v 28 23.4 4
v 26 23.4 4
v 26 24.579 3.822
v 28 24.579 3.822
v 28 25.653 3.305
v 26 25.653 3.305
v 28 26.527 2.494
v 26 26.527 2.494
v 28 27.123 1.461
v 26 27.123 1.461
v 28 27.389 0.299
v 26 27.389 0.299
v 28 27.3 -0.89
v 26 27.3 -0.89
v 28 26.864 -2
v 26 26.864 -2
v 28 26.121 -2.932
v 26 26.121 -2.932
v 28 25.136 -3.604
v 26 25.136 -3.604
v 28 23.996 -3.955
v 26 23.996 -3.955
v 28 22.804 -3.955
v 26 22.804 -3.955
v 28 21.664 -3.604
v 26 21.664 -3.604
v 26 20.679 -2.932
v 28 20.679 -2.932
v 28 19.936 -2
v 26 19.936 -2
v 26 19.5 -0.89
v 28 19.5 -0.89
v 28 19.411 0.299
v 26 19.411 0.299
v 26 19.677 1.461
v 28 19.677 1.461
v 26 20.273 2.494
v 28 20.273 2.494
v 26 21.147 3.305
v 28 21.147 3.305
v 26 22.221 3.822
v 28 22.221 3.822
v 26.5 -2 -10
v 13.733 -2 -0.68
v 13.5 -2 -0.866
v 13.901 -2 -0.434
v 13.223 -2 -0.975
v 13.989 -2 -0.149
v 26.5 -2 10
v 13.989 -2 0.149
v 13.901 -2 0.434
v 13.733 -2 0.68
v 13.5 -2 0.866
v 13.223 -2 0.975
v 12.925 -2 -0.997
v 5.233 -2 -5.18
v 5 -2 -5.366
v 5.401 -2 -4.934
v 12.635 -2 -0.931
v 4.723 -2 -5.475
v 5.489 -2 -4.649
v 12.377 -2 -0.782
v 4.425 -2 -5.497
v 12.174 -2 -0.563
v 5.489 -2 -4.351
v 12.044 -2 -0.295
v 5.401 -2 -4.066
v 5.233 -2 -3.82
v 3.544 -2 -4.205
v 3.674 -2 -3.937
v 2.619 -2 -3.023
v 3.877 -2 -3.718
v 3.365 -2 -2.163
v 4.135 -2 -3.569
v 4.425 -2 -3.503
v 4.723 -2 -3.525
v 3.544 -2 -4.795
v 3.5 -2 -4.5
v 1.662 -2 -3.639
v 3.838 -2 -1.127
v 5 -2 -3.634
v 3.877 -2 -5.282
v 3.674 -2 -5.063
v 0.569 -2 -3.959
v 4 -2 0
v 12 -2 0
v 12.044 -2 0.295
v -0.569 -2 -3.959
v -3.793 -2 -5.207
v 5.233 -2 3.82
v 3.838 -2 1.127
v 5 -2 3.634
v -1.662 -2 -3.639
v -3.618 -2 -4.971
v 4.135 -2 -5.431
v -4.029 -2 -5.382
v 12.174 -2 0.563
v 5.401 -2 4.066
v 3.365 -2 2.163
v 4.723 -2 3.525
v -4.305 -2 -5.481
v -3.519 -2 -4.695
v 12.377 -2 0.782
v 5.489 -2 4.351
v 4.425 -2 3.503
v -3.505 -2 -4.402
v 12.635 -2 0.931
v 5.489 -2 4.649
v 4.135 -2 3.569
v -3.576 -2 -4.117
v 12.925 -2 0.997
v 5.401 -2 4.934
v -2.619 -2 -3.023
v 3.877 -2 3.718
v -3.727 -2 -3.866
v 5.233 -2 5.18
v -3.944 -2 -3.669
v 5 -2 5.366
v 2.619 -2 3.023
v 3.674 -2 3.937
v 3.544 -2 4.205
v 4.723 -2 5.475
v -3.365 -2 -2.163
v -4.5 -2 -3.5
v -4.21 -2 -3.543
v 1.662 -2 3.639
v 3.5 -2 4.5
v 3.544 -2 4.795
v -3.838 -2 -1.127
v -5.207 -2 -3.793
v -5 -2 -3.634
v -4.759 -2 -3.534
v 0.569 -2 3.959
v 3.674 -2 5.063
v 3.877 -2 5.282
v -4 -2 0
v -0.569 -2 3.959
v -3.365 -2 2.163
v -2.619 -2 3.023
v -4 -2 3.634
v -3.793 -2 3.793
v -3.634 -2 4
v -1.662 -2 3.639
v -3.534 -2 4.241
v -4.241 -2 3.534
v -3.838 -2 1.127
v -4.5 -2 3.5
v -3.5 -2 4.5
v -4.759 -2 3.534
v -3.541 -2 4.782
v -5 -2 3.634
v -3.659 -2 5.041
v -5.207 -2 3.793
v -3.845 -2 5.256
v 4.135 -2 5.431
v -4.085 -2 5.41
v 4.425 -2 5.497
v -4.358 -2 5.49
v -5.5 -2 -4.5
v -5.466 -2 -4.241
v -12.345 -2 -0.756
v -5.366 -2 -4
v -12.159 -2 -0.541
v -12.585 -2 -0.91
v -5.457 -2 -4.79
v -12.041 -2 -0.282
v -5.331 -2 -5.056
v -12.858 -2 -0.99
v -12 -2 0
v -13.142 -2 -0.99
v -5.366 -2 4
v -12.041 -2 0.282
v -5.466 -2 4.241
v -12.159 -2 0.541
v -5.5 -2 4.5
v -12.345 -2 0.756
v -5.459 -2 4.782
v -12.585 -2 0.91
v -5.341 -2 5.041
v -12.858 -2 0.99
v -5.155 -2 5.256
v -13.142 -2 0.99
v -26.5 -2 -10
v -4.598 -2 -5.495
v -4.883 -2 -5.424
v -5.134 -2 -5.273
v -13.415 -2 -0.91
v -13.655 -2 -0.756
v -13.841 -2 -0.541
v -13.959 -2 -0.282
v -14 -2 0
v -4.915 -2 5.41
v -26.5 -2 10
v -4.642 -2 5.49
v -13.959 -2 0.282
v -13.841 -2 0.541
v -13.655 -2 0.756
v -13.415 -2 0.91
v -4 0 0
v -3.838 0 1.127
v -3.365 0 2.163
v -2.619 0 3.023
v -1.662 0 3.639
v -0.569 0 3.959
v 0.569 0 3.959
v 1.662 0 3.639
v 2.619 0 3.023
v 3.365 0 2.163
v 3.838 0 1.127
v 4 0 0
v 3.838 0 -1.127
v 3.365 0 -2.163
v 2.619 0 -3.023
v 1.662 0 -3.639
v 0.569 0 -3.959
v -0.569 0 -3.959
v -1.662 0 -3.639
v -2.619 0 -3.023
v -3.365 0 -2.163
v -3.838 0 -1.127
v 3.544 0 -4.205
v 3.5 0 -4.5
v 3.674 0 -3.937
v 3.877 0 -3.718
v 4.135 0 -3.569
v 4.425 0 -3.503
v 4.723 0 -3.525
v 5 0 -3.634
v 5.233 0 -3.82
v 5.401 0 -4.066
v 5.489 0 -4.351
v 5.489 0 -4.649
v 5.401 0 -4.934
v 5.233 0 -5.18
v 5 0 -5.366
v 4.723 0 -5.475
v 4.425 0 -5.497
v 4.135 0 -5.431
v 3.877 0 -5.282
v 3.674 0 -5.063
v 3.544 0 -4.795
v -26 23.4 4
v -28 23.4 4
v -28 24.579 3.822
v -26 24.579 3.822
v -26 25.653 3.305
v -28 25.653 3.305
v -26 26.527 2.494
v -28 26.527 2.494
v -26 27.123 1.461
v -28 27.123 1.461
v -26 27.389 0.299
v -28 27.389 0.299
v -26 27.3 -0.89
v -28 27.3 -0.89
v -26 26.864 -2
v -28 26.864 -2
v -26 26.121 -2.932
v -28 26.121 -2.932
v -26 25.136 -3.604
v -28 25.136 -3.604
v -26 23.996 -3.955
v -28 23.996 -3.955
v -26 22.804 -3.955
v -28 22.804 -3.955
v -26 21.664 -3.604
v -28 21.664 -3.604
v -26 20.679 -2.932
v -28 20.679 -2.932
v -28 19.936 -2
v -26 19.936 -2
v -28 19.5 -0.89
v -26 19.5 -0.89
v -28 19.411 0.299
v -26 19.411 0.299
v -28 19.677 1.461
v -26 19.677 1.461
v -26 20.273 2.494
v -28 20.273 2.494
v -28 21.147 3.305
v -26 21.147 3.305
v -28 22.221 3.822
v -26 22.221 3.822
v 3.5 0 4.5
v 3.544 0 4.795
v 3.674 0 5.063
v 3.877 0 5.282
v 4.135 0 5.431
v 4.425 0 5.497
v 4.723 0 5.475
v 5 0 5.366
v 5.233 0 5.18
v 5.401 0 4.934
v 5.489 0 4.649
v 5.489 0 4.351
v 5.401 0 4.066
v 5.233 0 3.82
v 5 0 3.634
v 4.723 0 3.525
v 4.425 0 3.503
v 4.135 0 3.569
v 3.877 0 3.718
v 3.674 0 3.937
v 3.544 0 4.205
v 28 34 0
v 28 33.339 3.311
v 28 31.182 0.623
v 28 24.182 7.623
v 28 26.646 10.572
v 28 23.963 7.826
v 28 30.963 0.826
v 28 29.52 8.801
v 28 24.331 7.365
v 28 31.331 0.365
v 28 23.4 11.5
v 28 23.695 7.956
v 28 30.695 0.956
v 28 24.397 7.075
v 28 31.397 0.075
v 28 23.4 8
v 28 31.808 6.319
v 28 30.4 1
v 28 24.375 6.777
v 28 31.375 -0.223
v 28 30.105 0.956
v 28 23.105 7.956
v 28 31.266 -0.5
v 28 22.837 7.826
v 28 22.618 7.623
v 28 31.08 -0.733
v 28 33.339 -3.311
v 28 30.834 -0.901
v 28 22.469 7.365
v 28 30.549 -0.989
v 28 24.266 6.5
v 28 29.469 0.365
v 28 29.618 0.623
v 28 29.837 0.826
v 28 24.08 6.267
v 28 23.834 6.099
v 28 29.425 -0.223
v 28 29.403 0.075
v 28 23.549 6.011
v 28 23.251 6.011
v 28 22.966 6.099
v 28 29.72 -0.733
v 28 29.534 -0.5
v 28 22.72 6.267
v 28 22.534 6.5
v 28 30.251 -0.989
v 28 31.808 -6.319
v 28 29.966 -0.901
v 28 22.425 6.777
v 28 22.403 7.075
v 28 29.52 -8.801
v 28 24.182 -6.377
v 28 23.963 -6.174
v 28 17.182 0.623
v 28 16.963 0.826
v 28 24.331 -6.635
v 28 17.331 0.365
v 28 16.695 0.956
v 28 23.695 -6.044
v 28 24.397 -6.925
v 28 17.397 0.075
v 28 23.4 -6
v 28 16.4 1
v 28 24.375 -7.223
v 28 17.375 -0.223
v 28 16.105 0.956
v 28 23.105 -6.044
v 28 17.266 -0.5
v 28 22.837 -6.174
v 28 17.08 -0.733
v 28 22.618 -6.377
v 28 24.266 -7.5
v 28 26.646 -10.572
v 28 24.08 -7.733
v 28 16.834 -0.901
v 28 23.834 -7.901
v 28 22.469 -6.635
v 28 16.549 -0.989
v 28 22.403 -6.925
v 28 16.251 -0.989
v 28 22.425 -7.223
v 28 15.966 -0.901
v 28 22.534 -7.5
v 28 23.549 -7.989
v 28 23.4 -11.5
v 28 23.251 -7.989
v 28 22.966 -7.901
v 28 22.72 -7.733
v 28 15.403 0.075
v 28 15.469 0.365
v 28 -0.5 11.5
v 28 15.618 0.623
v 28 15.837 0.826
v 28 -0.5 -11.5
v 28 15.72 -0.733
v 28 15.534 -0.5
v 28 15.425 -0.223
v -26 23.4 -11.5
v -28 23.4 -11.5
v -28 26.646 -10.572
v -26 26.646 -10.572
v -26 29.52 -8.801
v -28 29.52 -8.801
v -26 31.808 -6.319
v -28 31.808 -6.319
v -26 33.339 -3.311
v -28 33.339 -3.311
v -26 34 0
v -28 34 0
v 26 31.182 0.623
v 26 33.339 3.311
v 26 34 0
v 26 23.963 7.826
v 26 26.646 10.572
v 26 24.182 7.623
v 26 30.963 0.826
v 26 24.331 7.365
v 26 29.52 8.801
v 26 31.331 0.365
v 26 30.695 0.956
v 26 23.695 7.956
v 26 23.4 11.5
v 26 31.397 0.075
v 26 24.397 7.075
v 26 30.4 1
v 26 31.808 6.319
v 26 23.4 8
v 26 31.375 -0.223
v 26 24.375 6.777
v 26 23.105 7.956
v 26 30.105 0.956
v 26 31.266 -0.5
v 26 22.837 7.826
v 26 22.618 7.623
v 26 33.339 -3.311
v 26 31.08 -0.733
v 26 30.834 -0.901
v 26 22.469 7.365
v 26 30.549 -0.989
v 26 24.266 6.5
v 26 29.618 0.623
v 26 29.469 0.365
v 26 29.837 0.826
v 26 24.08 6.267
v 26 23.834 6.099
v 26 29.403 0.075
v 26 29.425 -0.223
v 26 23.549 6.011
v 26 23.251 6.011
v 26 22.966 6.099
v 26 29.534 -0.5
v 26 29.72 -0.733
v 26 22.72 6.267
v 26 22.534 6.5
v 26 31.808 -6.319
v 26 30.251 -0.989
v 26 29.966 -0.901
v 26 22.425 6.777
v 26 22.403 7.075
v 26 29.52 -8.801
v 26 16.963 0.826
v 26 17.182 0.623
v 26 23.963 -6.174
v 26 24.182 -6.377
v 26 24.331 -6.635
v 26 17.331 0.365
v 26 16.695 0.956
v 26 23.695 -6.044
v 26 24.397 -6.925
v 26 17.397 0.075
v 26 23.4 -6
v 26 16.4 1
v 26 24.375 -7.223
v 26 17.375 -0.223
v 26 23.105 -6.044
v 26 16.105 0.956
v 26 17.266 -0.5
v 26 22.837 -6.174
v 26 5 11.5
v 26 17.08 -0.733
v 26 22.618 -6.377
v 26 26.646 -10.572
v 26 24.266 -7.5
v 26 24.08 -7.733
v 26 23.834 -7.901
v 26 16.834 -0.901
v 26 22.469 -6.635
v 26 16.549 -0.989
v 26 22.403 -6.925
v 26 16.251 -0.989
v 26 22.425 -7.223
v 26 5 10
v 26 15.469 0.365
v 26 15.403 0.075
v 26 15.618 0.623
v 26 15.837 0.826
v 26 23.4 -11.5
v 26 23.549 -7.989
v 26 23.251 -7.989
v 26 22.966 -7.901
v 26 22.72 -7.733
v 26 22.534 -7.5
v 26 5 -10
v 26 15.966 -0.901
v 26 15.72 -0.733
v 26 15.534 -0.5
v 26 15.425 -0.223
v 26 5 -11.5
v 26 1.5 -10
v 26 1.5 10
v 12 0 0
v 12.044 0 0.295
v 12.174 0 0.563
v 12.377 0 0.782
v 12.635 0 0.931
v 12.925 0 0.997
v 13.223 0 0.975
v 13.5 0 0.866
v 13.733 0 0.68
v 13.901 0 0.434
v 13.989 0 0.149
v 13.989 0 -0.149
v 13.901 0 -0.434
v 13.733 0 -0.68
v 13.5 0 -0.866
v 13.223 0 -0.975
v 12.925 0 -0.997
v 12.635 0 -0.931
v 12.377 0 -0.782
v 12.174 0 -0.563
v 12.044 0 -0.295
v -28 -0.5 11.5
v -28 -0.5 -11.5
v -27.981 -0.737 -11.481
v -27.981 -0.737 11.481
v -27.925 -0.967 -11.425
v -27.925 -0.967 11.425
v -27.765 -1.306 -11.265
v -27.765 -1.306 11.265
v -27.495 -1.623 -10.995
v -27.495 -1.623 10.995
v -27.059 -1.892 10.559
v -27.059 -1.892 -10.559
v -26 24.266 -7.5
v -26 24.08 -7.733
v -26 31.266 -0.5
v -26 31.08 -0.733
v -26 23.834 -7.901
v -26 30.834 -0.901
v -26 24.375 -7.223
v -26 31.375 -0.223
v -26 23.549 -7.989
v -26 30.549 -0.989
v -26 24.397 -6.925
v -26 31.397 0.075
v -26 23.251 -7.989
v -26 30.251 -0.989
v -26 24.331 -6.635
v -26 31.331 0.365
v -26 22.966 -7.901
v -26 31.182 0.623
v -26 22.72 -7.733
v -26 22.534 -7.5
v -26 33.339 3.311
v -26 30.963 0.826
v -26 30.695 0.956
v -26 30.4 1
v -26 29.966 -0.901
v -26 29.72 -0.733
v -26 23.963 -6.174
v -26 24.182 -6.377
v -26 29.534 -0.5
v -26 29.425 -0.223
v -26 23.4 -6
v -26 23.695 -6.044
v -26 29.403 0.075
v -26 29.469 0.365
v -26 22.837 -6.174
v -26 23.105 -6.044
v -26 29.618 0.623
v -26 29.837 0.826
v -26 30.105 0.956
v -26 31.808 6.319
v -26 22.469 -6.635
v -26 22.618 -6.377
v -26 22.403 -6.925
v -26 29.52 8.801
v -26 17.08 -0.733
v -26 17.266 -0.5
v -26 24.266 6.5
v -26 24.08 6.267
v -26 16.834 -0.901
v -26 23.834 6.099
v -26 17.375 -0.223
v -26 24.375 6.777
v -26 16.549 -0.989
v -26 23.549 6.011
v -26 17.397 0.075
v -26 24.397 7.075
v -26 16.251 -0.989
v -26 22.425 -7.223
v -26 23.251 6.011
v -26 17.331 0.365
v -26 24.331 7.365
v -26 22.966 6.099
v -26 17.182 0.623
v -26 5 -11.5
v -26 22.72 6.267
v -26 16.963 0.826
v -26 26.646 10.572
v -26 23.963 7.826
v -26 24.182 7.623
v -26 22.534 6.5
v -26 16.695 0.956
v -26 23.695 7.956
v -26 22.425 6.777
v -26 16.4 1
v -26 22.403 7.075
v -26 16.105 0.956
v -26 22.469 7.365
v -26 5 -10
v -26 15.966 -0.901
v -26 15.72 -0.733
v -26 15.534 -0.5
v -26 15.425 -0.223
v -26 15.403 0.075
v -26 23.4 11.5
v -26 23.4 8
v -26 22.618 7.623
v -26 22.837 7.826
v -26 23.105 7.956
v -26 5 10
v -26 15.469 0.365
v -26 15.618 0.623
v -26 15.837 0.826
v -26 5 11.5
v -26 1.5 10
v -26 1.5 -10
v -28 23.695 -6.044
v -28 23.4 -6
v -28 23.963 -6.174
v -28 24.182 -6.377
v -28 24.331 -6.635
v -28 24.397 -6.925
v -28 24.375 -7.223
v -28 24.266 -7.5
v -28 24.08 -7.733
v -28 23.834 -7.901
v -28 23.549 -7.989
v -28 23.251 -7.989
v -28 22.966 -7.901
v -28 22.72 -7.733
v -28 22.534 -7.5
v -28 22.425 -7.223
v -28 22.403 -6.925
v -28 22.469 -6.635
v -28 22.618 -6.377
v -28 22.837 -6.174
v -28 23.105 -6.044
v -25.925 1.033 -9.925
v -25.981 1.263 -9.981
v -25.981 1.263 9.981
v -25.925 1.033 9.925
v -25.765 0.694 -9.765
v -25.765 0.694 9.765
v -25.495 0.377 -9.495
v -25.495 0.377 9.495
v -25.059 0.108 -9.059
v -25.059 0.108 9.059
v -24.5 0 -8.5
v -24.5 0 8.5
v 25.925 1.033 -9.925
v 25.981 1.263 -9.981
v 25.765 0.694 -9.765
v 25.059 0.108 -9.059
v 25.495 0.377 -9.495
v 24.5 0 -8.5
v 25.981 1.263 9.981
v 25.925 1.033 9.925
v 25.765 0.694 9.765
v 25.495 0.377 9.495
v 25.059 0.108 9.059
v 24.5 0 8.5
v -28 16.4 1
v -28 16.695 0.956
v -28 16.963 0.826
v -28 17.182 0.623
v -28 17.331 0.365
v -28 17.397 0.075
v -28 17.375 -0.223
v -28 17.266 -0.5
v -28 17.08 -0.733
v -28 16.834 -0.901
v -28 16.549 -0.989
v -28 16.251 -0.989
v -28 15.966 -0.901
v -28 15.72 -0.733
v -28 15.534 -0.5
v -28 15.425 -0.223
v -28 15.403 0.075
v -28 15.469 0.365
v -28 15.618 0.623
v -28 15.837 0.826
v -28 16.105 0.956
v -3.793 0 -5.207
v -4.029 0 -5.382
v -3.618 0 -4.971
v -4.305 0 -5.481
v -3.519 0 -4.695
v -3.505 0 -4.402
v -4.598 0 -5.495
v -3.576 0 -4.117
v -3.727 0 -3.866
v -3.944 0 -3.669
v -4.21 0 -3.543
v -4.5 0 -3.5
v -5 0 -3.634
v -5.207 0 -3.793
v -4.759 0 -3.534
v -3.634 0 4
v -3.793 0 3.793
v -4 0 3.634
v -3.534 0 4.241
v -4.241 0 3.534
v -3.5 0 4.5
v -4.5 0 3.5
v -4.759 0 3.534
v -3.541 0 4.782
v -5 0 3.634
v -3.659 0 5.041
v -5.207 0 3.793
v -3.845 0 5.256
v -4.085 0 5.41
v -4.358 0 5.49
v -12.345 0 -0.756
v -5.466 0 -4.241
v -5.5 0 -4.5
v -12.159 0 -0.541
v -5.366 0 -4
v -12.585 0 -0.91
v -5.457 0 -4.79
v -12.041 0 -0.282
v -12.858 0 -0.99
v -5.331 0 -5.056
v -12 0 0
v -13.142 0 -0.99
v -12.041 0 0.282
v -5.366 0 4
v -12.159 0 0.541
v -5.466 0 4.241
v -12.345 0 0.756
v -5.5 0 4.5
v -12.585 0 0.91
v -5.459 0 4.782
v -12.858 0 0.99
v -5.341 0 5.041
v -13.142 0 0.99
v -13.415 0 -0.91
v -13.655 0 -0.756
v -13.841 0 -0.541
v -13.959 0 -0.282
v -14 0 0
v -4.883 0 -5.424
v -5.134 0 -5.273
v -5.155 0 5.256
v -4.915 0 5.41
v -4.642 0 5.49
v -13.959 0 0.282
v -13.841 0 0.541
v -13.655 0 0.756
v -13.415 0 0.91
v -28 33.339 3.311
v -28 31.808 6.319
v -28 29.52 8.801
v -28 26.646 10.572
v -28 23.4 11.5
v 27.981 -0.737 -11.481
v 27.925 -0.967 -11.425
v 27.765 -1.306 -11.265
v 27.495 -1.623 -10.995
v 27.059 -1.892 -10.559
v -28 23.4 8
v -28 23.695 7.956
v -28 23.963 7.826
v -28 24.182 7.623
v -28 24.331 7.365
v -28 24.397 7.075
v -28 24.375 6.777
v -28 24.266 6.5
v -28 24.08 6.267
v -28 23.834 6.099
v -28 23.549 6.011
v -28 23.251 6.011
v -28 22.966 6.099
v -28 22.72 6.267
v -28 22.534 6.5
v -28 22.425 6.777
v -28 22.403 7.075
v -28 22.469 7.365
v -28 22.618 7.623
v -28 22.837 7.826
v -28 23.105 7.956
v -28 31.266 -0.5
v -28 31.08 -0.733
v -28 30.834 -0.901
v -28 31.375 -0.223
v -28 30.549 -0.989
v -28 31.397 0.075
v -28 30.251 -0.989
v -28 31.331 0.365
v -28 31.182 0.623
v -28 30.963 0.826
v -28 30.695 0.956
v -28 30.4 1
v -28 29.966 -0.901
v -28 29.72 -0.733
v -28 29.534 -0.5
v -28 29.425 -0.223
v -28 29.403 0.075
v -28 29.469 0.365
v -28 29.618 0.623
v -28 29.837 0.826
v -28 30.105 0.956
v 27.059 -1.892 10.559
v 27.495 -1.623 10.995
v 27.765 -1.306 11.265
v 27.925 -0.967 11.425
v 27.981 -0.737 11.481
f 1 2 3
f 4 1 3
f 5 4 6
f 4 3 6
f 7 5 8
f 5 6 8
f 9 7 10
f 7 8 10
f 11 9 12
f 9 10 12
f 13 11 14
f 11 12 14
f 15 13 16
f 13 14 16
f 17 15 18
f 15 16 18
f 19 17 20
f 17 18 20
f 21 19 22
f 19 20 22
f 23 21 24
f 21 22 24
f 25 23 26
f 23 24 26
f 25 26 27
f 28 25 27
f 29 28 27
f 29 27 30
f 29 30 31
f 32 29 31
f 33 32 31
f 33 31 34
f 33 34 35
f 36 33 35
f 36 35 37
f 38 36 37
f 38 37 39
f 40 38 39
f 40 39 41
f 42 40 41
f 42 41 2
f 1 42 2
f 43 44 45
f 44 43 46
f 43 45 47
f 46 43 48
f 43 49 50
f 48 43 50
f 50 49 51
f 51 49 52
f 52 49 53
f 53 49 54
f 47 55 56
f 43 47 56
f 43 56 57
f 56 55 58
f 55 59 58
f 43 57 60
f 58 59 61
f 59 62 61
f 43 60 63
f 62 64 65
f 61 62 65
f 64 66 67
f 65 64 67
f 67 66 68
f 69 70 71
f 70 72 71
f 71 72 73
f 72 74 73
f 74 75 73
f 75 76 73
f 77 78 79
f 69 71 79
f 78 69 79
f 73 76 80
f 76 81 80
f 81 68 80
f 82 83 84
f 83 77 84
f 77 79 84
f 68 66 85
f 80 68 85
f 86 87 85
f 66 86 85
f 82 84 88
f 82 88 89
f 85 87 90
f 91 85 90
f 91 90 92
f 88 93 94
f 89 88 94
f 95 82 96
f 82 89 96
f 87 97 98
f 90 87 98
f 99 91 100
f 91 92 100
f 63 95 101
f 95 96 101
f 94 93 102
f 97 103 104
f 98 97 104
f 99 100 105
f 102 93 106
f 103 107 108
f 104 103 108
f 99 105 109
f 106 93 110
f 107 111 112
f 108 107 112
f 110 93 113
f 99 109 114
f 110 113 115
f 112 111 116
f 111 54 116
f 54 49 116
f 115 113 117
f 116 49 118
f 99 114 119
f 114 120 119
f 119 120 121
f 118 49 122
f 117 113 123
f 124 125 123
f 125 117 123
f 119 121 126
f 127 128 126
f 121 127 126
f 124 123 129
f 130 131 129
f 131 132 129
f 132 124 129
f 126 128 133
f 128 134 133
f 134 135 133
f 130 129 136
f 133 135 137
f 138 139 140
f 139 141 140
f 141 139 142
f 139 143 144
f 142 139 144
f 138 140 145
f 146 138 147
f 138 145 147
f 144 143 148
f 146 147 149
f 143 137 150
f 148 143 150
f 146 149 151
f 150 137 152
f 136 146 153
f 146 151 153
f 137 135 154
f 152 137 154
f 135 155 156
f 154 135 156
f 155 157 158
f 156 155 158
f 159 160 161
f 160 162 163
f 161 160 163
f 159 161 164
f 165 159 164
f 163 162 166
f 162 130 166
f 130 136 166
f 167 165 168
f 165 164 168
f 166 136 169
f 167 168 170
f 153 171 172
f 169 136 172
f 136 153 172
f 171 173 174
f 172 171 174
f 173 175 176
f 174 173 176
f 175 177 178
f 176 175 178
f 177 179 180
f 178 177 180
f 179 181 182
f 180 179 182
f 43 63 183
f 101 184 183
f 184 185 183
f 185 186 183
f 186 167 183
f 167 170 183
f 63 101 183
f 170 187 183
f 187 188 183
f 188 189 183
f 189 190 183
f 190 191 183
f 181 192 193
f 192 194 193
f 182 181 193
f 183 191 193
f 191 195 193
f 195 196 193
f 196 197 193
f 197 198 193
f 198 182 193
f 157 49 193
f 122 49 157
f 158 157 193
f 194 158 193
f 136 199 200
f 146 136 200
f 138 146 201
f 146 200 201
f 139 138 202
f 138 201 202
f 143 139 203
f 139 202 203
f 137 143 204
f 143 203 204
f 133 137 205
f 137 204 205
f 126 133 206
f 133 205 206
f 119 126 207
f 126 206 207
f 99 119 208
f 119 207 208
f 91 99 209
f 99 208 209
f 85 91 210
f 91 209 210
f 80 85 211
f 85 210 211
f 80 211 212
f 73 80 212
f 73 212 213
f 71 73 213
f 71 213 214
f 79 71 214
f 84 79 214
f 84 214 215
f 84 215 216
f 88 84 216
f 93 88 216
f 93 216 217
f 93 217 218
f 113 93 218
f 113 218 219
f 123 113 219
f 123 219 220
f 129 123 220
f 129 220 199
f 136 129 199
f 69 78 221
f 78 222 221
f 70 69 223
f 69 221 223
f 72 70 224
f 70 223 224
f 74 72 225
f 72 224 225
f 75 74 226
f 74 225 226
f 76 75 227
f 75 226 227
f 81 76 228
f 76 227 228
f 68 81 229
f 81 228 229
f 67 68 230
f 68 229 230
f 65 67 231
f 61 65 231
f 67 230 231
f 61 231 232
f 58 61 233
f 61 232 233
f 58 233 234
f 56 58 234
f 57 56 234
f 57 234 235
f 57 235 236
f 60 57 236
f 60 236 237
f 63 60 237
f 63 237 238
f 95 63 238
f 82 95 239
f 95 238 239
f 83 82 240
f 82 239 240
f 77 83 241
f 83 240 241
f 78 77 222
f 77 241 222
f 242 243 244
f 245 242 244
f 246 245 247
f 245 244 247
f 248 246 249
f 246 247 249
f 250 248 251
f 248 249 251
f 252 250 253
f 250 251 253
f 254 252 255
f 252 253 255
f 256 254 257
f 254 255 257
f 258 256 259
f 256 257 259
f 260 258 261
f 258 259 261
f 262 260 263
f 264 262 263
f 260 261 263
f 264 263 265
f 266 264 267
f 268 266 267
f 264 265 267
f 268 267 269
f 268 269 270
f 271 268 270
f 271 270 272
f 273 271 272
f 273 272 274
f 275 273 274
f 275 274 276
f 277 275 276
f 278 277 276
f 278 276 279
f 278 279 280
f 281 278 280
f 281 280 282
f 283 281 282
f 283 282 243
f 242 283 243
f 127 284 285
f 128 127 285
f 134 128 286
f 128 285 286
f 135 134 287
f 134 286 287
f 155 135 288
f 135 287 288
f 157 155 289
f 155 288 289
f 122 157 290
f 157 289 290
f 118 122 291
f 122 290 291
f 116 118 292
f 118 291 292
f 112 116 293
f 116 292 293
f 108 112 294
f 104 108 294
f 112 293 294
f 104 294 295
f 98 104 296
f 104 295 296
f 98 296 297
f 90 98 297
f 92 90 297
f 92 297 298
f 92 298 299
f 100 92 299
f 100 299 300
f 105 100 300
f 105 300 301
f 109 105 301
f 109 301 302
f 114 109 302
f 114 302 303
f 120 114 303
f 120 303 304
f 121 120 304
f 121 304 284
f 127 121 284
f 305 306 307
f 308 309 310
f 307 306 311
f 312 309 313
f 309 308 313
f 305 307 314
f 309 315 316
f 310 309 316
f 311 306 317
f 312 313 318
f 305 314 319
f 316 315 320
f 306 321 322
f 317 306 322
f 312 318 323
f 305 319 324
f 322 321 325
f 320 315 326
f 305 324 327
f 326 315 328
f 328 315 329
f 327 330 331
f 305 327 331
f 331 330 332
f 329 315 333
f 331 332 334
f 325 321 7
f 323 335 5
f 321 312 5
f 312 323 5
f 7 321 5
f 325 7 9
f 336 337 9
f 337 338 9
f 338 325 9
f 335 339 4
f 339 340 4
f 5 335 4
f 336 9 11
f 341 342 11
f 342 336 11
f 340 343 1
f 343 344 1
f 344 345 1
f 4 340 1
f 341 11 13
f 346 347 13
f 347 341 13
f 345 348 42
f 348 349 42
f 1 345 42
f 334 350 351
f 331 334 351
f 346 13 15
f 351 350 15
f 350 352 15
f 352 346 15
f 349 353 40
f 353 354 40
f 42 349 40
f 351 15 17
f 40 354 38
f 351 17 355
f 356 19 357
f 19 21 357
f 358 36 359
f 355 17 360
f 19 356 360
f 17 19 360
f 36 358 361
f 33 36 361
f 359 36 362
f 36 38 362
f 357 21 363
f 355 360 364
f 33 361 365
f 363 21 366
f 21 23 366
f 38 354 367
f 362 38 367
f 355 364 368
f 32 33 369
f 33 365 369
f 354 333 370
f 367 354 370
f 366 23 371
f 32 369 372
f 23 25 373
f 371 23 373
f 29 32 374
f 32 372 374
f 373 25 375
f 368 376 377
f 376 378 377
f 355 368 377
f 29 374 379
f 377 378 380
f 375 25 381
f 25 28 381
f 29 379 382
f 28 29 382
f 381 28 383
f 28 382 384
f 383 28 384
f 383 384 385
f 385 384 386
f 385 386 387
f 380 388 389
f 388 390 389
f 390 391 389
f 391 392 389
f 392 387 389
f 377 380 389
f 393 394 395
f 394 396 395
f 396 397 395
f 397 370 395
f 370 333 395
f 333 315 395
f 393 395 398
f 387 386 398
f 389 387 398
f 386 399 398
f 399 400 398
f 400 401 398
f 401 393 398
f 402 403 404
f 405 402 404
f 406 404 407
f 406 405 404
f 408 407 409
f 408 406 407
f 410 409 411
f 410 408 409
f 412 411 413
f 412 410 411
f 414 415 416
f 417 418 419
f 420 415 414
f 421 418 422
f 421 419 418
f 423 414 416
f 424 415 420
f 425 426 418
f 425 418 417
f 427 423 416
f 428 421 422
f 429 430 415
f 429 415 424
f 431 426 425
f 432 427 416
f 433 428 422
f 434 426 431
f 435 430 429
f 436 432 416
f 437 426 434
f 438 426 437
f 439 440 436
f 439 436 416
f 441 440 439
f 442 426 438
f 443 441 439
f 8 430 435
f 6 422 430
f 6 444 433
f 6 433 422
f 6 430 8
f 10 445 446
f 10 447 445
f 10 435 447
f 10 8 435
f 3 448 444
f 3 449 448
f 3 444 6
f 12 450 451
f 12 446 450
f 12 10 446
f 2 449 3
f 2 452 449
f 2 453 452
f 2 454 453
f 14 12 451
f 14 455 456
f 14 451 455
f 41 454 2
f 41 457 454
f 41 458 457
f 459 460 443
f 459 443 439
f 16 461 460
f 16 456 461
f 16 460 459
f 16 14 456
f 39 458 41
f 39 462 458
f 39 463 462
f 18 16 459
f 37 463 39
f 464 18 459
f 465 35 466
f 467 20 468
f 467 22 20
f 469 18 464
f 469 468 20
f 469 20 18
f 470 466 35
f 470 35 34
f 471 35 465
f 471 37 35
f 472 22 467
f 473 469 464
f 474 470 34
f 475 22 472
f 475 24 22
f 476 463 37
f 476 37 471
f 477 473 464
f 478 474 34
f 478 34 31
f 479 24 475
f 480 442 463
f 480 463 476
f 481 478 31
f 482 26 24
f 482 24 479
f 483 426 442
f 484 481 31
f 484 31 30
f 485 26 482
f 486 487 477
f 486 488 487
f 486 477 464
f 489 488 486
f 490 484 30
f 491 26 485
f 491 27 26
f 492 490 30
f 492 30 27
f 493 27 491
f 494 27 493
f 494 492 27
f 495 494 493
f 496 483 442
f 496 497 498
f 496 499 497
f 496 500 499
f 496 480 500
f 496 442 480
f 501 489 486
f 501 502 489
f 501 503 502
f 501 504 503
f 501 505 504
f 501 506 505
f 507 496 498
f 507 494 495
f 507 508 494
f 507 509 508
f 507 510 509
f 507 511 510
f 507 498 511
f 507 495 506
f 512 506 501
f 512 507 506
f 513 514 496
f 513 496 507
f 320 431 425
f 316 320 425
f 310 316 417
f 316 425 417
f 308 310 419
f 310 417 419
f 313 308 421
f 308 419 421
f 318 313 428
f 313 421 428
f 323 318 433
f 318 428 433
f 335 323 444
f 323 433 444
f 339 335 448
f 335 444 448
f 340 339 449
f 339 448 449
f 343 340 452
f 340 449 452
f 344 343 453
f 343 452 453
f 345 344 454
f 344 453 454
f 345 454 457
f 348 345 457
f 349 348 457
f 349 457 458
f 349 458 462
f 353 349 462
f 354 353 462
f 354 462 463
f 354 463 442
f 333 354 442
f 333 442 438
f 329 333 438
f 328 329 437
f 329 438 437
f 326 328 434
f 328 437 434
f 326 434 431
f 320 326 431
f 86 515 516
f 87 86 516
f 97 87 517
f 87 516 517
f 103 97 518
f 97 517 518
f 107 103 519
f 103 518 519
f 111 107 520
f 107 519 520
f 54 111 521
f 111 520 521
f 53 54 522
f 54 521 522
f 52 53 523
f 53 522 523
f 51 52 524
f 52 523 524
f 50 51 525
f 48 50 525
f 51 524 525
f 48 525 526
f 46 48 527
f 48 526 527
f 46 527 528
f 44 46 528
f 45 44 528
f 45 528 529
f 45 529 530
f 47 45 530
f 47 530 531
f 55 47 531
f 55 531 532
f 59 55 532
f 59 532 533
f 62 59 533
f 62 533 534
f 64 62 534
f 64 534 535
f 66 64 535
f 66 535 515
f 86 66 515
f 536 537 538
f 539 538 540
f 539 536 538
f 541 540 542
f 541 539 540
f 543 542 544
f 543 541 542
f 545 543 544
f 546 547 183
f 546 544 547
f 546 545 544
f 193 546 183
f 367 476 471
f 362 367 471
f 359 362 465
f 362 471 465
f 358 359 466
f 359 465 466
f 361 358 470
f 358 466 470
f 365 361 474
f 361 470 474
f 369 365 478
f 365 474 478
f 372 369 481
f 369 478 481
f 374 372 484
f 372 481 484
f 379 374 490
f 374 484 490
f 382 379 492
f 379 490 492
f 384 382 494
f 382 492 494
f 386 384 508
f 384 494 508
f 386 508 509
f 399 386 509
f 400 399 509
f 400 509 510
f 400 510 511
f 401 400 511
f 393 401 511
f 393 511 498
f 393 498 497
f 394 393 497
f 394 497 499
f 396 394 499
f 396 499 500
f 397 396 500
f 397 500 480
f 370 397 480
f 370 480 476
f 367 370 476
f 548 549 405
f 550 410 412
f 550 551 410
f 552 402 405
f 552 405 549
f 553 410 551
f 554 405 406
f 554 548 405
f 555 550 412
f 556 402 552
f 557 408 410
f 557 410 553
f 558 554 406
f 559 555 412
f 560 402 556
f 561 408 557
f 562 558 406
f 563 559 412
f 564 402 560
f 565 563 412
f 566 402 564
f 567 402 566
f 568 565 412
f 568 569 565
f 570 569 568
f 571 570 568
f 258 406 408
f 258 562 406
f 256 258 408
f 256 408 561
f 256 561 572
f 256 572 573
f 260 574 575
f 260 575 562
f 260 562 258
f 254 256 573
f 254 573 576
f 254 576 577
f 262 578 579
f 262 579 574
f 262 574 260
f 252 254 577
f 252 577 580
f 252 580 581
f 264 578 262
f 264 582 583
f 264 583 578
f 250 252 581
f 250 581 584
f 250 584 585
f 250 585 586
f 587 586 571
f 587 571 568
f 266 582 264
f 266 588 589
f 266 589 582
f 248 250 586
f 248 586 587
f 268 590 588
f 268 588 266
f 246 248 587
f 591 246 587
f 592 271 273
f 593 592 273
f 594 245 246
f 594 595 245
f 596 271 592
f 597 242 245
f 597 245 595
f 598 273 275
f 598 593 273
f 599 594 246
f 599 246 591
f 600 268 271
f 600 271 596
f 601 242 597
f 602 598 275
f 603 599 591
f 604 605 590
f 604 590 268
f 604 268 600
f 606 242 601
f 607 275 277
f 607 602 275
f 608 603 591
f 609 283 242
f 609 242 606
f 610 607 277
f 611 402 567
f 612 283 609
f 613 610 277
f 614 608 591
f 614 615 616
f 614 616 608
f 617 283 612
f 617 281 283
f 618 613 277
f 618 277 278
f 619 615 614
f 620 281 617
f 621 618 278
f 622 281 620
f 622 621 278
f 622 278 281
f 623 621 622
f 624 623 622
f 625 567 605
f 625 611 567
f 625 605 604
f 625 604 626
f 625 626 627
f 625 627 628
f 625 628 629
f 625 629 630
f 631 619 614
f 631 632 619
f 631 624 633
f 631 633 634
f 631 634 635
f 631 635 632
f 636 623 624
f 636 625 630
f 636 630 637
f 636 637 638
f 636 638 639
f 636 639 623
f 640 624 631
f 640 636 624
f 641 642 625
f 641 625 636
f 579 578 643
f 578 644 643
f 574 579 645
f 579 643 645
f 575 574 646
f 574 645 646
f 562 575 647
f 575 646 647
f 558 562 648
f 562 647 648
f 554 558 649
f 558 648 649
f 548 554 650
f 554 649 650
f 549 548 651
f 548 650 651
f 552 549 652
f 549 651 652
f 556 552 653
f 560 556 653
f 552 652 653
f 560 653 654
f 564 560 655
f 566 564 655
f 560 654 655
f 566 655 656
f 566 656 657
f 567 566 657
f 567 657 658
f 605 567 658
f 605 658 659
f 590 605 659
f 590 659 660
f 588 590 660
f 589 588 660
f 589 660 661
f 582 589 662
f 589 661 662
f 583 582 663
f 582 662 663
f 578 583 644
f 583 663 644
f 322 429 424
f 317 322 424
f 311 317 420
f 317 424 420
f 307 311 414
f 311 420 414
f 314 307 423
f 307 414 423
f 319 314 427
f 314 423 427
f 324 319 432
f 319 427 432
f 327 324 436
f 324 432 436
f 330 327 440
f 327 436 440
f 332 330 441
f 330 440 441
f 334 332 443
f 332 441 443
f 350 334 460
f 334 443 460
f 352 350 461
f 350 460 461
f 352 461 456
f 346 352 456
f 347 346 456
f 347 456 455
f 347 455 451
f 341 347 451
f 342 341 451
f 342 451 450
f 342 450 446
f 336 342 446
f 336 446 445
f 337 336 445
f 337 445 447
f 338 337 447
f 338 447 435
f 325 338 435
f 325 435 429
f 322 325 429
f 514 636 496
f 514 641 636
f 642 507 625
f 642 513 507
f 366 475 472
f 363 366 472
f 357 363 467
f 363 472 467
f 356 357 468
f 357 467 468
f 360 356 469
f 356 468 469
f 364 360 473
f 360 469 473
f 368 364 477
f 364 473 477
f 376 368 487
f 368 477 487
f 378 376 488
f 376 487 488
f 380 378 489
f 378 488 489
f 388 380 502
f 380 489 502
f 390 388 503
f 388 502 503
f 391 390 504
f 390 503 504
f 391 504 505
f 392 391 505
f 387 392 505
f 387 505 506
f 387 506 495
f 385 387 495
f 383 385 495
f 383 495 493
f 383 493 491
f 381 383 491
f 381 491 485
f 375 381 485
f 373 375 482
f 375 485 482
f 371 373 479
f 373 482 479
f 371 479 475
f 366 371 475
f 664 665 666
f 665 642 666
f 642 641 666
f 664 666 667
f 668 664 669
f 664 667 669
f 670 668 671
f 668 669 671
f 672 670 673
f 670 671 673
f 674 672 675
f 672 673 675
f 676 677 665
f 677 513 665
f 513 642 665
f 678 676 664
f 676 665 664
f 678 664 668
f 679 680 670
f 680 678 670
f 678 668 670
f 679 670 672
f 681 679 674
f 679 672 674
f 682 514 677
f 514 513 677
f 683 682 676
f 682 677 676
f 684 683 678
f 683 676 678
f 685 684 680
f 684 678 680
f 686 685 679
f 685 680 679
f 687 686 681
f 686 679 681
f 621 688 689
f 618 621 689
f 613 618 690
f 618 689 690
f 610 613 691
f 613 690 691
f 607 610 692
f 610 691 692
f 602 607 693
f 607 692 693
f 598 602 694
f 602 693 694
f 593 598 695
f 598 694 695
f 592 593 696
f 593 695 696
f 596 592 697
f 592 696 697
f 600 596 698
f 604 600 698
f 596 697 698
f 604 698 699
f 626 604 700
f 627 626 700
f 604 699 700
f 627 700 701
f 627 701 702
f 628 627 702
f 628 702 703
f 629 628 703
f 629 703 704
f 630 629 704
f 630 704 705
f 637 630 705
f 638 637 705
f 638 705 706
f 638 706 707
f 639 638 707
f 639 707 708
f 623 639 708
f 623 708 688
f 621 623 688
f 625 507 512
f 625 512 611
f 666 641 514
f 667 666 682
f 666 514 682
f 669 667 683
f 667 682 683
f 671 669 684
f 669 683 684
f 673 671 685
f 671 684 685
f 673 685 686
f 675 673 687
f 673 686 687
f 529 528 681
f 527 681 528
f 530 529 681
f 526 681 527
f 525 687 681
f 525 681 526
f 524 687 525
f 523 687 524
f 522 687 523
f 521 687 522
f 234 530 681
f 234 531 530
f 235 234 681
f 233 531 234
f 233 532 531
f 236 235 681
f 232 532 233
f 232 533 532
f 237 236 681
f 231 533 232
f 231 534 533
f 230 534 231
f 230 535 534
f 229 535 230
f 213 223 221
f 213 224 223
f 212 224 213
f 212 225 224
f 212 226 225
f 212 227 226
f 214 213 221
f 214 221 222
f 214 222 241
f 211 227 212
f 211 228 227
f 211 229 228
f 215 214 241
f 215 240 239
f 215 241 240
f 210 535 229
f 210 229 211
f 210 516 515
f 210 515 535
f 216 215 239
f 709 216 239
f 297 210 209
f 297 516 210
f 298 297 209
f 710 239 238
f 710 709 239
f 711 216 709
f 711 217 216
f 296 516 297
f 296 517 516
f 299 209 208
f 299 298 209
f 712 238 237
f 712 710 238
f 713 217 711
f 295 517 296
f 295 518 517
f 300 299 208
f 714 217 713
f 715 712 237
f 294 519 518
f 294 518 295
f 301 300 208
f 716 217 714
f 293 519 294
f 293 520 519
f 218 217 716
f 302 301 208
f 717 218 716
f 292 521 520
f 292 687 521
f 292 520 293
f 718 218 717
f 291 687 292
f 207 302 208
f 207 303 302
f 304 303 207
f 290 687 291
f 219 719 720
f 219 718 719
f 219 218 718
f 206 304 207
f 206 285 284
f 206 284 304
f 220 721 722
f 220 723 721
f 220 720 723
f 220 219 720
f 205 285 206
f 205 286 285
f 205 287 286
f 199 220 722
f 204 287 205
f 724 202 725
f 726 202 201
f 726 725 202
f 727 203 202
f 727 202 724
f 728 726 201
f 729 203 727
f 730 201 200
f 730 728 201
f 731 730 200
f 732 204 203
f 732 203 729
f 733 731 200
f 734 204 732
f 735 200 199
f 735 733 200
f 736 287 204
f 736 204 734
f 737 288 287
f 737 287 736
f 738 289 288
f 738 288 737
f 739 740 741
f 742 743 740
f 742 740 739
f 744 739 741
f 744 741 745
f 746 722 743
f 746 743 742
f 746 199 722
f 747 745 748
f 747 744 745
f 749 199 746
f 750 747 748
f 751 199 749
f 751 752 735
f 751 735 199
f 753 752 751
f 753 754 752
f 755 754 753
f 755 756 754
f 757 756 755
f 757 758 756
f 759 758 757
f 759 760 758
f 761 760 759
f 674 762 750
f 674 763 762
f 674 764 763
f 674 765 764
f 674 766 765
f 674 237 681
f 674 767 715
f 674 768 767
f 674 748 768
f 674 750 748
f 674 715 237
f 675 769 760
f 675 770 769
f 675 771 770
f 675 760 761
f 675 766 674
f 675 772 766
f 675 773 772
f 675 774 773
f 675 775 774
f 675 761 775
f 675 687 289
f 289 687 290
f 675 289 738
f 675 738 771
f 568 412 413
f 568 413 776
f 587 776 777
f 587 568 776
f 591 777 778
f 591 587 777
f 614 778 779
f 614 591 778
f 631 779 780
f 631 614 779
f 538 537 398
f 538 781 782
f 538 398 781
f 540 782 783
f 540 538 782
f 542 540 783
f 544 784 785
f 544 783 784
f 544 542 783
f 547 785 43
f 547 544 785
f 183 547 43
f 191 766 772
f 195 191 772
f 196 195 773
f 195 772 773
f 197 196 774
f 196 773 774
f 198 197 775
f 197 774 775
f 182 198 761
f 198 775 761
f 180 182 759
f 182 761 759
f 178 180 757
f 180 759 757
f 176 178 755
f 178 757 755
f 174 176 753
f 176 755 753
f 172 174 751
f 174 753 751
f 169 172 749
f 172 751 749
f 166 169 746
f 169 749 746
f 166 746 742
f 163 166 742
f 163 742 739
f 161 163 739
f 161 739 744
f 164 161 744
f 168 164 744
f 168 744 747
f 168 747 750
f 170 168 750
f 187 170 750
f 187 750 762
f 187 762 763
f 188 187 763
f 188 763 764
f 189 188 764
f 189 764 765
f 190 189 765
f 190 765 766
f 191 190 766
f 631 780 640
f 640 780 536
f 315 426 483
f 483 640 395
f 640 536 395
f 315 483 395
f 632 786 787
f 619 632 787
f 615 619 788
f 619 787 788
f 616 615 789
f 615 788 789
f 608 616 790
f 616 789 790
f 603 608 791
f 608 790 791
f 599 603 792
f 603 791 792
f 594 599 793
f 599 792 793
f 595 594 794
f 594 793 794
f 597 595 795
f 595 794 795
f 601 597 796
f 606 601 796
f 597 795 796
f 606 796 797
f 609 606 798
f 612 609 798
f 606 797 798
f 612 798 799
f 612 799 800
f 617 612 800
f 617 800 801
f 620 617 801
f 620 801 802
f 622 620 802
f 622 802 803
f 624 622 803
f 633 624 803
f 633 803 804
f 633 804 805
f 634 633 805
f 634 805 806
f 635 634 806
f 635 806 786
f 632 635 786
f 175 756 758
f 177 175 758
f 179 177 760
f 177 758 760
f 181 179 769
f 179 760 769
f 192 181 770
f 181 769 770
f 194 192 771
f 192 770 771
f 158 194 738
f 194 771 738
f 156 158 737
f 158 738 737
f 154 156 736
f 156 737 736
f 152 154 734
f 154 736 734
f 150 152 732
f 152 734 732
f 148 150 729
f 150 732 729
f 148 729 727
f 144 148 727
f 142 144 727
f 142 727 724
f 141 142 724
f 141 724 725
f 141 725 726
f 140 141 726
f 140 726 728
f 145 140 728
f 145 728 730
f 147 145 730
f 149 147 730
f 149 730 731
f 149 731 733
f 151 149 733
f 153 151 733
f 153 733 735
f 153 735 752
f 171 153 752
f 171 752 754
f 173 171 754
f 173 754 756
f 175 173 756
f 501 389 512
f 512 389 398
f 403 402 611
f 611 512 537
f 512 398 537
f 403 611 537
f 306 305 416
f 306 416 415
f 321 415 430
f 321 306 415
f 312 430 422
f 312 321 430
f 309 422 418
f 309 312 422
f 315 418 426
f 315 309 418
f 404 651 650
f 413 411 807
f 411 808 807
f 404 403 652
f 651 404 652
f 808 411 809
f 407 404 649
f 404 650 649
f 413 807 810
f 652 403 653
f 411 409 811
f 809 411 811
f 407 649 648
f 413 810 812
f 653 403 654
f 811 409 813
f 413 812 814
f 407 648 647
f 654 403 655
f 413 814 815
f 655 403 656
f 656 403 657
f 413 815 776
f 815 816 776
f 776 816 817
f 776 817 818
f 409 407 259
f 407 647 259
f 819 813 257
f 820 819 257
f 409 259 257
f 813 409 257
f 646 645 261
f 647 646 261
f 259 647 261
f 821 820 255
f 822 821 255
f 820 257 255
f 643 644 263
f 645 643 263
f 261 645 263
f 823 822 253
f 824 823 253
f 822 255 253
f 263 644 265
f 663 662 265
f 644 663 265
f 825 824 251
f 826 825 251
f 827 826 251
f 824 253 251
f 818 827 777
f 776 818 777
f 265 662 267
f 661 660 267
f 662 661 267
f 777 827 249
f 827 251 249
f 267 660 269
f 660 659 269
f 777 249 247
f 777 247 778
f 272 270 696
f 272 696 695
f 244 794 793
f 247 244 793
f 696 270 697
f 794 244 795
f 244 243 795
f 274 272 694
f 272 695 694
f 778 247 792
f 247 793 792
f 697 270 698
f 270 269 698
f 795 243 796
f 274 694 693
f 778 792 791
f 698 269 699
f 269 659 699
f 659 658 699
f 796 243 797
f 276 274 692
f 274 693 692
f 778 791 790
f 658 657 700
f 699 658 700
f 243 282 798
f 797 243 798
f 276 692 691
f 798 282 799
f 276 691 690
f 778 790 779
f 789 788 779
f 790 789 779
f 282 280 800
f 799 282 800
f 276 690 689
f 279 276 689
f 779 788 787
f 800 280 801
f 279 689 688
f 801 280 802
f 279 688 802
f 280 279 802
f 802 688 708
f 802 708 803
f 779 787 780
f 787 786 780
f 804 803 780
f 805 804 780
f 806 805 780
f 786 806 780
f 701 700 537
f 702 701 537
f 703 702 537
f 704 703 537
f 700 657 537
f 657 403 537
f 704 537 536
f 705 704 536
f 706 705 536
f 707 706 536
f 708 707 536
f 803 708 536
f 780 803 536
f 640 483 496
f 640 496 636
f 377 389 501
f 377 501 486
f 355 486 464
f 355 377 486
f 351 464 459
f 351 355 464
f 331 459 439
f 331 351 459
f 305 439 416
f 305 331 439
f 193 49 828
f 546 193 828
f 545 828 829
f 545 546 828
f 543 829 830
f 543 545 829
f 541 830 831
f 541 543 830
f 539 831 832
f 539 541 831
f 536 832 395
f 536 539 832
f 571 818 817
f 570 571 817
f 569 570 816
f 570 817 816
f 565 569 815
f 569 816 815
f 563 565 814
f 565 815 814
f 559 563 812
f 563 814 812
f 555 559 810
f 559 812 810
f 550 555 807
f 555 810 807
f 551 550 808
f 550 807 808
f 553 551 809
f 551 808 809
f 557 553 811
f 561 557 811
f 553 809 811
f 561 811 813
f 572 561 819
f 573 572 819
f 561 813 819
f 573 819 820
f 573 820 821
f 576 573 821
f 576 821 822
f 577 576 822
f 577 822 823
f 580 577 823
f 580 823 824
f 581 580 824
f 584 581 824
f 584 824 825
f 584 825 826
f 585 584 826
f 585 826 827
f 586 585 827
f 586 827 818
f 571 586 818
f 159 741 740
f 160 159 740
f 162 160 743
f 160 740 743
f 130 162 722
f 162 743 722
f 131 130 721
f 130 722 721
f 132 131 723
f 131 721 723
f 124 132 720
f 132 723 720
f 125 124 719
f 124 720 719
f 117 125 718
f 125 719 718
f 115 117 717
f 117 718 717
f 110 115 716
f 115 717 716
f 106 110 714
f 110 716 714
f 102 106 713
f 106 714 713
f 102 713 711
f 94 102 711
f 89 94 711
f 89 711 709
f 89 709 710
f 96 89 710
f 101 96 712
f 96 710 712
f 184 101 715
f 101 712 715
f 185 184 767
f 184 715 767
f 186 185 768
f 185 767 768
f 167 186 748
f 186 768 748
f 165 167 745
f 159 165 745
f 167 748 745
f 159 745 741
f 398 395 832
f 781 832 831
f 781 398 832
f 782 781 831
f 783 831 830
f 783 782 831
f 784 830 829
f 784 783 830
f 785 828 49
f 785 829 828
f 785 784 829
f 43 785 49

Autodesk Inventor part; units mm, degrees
ref_plane "YZ Plane" through (0, 0, 0) normal (1, 0, 0) x (0, 1, 0)
ref_plane "XZ Plane" through (0, 0, 0) normal (0, 1, 0) x (-1, 0, 0)
ref_plane "XY Plane" through (0, 0, 0) normal (0, 0, 1) x (1, 0, 0)
sketch "Esboço1" plane through (0, 0, 0) normal (0, 1, 0) x (-1, 0, 0)
  line L0 (-25.9999, 11.4129) -> (25.9999, -11.4129) construction
  line L1 (28, 11.5) -> (-28, -11.5) construction
  circle A0 centre (0, 0) radius 4
  line L2 (26, 10) -> (-26, 10)
  line L3 (-26, 10) -> (-26, -10)
  line L4 (-26, -10) -> (26, -10)
  line L5 (26, -10) -> (26, 10)
  line L6 (26, 10) -> (-26, -10) construction
  line L7 (-26, 10) -> (26, -10) construction
  line L8 (13, 0) -> (-13, 0)
  circle A1 centre (-13, 0) radius 1
  circle A2 centre (13, 0) radius 1
  line L9 (4.5, 4.5) -> (-4.5, 4.5)
  line L10 (4.5, -4.5) -> (4.5, 4.5)
  line L11 (4.5, 4.5) -> (-4.5, -4.5) construction
  line L12 (-4.5, 4.5) -> (4.5, -4.5) construction
  circle A3 centre (4.5, 4.5) radius 1
  circle A4 centre (4.5, -4.5) radius 1
  circle A5 centre (-4.5, 4.5) radius 1
  circle A6 centre (-4.5, -4.5) radius 1
  line L13 (28, 11.5) -> (-28, 11.5)
  line L14 (-28, 11.5) -> (-28, -11.5)
  line L15 (-28, -11.5) -> (28, -11.5)
  line L16 (28, -11.5) -> (28, 11.5)
  line L17 (28, 11.5) -> (-28, -11.5) construction
  line L18 (-28, 11.5) -> (28, -11.5) construction
  line L19 (26, -10) -> (26, -11.5)
  line L20 (26, 10) -> (26, 11.5)
  line L21 (-26, 10) -> (-26, 11.5)
  line L22 (-26, -10) -> (-26, -11.5)
  dimension "d0" = 54
  dimension "d1" = 23
  dimension "d2" = 8
  dimension "d3" = 52
  dimension "d4" = 20
  dimension "d5" = 26
  dimension "d6" = 2
  dimension "d7" = 2
  dimension "d8" = 9
  dimension "d9" = 9
  dimension "d10" = 2
  dimension "d13" = 9
  dimension "d16" = 9
  dimension "d19" = 56
  dimension "d20" = 23
extrude "Extrusão1" add sketch "Esboço1" along normal blind 34 and the other way blind 2 contours L20 L13 L16 L15 L19 L5 | L3 L22 L15 L14 L13 L21
extrude "Extrusão2" add sketch "Esboço1" along normal blind 5 and the other way blind 2 contours L2 L21 L13 L20 | L19 L15 L22 L4
extrude "Extrusão3" add sketch "Esboço1" against normal blind 2 contours L5 L4 L3 L2
sketch "Esboço3" plane through (-28, -2, -11.5) normal (-1, 0, 0) x (0, 0, 1)
  line L0 (11.5, 2) -> (11.5, 25.4)
  circle A0 centre (11.5, 25.4) radius 4
  line L1 (11.5, 25.4) -> (11.5, 18.4)
  circle A1 centre (11.5, 18.4) radius 1
  circle A2 centre (18.5, 25.4) radius 1
  circle A3 centre (11.5, 32.4) radius 1
  circle A4 centre (4.5, 25.4) radius 1
  line L2 (11.5, 2) -> (-22.5, 2)
  line L3 (7.5, 2) -> (15.5, 2) projected
  line L4 (11.5, 2) -> (11.5, 36)
  line L5 (-7.4457, 25.4) -> (30.4457, 25.4)
  line L6 (0, 36) -> (0, 7) projected
  arc A5 (11.5, 36) -> (0, 25.4) centre (12.2417, 23.6571) ccw
  arc A6 (23, 25.4) -> (11.5, 36) centre (10.7583, 23.6571) ccw
  line L7 (0, 0) -> (0, 36) projected
  line L8 (0, 25.4) -> (0, 36)
  line L9 (0, 36) -> (23, 36)
  line L10 (23, 36) -> (23, 25.4)
  point P0 (-22.5, 2)
  point P1 (11.5, 36)
  point P2 (11.5, 36)
  dimension "d27" = 23.4
  dimension "d28" = 8
  dimension "d29" = 7
  dimension "d30" = 2
  dimension "d33" = 360
  dimension "d39" = 34
  dimension "d40" = 34
extrude "Extrusão4" cut sketch "Esboço3" along normal blind 5.75 and the other way blind 76 contours A1 L0 | L0 A1 | A0 L5 L0 | L0 L5 A0 | L5 A0 L4 | L4 A0 L5 | L5 A4 | A4 L5 | L5 A2 | A2 L5 | L4 A3 | A3 L4
extrude "Extrusão5" cut sketch "Esboço3" along normal blind 5.75 and the other way blind 76 contours L6 L9 A5 | L9 L10 A6
fillet "Arredondamento2" radius 1.5 8 edges at (0, 0, 10) (-26, 0, 0) (0, 0, -10) (26, 0, 0) (0, -2, 11.5) (-28, -2, 0) (0, -2, -11.5) (28, -2, 0)
properties part number "ShotFrame"
